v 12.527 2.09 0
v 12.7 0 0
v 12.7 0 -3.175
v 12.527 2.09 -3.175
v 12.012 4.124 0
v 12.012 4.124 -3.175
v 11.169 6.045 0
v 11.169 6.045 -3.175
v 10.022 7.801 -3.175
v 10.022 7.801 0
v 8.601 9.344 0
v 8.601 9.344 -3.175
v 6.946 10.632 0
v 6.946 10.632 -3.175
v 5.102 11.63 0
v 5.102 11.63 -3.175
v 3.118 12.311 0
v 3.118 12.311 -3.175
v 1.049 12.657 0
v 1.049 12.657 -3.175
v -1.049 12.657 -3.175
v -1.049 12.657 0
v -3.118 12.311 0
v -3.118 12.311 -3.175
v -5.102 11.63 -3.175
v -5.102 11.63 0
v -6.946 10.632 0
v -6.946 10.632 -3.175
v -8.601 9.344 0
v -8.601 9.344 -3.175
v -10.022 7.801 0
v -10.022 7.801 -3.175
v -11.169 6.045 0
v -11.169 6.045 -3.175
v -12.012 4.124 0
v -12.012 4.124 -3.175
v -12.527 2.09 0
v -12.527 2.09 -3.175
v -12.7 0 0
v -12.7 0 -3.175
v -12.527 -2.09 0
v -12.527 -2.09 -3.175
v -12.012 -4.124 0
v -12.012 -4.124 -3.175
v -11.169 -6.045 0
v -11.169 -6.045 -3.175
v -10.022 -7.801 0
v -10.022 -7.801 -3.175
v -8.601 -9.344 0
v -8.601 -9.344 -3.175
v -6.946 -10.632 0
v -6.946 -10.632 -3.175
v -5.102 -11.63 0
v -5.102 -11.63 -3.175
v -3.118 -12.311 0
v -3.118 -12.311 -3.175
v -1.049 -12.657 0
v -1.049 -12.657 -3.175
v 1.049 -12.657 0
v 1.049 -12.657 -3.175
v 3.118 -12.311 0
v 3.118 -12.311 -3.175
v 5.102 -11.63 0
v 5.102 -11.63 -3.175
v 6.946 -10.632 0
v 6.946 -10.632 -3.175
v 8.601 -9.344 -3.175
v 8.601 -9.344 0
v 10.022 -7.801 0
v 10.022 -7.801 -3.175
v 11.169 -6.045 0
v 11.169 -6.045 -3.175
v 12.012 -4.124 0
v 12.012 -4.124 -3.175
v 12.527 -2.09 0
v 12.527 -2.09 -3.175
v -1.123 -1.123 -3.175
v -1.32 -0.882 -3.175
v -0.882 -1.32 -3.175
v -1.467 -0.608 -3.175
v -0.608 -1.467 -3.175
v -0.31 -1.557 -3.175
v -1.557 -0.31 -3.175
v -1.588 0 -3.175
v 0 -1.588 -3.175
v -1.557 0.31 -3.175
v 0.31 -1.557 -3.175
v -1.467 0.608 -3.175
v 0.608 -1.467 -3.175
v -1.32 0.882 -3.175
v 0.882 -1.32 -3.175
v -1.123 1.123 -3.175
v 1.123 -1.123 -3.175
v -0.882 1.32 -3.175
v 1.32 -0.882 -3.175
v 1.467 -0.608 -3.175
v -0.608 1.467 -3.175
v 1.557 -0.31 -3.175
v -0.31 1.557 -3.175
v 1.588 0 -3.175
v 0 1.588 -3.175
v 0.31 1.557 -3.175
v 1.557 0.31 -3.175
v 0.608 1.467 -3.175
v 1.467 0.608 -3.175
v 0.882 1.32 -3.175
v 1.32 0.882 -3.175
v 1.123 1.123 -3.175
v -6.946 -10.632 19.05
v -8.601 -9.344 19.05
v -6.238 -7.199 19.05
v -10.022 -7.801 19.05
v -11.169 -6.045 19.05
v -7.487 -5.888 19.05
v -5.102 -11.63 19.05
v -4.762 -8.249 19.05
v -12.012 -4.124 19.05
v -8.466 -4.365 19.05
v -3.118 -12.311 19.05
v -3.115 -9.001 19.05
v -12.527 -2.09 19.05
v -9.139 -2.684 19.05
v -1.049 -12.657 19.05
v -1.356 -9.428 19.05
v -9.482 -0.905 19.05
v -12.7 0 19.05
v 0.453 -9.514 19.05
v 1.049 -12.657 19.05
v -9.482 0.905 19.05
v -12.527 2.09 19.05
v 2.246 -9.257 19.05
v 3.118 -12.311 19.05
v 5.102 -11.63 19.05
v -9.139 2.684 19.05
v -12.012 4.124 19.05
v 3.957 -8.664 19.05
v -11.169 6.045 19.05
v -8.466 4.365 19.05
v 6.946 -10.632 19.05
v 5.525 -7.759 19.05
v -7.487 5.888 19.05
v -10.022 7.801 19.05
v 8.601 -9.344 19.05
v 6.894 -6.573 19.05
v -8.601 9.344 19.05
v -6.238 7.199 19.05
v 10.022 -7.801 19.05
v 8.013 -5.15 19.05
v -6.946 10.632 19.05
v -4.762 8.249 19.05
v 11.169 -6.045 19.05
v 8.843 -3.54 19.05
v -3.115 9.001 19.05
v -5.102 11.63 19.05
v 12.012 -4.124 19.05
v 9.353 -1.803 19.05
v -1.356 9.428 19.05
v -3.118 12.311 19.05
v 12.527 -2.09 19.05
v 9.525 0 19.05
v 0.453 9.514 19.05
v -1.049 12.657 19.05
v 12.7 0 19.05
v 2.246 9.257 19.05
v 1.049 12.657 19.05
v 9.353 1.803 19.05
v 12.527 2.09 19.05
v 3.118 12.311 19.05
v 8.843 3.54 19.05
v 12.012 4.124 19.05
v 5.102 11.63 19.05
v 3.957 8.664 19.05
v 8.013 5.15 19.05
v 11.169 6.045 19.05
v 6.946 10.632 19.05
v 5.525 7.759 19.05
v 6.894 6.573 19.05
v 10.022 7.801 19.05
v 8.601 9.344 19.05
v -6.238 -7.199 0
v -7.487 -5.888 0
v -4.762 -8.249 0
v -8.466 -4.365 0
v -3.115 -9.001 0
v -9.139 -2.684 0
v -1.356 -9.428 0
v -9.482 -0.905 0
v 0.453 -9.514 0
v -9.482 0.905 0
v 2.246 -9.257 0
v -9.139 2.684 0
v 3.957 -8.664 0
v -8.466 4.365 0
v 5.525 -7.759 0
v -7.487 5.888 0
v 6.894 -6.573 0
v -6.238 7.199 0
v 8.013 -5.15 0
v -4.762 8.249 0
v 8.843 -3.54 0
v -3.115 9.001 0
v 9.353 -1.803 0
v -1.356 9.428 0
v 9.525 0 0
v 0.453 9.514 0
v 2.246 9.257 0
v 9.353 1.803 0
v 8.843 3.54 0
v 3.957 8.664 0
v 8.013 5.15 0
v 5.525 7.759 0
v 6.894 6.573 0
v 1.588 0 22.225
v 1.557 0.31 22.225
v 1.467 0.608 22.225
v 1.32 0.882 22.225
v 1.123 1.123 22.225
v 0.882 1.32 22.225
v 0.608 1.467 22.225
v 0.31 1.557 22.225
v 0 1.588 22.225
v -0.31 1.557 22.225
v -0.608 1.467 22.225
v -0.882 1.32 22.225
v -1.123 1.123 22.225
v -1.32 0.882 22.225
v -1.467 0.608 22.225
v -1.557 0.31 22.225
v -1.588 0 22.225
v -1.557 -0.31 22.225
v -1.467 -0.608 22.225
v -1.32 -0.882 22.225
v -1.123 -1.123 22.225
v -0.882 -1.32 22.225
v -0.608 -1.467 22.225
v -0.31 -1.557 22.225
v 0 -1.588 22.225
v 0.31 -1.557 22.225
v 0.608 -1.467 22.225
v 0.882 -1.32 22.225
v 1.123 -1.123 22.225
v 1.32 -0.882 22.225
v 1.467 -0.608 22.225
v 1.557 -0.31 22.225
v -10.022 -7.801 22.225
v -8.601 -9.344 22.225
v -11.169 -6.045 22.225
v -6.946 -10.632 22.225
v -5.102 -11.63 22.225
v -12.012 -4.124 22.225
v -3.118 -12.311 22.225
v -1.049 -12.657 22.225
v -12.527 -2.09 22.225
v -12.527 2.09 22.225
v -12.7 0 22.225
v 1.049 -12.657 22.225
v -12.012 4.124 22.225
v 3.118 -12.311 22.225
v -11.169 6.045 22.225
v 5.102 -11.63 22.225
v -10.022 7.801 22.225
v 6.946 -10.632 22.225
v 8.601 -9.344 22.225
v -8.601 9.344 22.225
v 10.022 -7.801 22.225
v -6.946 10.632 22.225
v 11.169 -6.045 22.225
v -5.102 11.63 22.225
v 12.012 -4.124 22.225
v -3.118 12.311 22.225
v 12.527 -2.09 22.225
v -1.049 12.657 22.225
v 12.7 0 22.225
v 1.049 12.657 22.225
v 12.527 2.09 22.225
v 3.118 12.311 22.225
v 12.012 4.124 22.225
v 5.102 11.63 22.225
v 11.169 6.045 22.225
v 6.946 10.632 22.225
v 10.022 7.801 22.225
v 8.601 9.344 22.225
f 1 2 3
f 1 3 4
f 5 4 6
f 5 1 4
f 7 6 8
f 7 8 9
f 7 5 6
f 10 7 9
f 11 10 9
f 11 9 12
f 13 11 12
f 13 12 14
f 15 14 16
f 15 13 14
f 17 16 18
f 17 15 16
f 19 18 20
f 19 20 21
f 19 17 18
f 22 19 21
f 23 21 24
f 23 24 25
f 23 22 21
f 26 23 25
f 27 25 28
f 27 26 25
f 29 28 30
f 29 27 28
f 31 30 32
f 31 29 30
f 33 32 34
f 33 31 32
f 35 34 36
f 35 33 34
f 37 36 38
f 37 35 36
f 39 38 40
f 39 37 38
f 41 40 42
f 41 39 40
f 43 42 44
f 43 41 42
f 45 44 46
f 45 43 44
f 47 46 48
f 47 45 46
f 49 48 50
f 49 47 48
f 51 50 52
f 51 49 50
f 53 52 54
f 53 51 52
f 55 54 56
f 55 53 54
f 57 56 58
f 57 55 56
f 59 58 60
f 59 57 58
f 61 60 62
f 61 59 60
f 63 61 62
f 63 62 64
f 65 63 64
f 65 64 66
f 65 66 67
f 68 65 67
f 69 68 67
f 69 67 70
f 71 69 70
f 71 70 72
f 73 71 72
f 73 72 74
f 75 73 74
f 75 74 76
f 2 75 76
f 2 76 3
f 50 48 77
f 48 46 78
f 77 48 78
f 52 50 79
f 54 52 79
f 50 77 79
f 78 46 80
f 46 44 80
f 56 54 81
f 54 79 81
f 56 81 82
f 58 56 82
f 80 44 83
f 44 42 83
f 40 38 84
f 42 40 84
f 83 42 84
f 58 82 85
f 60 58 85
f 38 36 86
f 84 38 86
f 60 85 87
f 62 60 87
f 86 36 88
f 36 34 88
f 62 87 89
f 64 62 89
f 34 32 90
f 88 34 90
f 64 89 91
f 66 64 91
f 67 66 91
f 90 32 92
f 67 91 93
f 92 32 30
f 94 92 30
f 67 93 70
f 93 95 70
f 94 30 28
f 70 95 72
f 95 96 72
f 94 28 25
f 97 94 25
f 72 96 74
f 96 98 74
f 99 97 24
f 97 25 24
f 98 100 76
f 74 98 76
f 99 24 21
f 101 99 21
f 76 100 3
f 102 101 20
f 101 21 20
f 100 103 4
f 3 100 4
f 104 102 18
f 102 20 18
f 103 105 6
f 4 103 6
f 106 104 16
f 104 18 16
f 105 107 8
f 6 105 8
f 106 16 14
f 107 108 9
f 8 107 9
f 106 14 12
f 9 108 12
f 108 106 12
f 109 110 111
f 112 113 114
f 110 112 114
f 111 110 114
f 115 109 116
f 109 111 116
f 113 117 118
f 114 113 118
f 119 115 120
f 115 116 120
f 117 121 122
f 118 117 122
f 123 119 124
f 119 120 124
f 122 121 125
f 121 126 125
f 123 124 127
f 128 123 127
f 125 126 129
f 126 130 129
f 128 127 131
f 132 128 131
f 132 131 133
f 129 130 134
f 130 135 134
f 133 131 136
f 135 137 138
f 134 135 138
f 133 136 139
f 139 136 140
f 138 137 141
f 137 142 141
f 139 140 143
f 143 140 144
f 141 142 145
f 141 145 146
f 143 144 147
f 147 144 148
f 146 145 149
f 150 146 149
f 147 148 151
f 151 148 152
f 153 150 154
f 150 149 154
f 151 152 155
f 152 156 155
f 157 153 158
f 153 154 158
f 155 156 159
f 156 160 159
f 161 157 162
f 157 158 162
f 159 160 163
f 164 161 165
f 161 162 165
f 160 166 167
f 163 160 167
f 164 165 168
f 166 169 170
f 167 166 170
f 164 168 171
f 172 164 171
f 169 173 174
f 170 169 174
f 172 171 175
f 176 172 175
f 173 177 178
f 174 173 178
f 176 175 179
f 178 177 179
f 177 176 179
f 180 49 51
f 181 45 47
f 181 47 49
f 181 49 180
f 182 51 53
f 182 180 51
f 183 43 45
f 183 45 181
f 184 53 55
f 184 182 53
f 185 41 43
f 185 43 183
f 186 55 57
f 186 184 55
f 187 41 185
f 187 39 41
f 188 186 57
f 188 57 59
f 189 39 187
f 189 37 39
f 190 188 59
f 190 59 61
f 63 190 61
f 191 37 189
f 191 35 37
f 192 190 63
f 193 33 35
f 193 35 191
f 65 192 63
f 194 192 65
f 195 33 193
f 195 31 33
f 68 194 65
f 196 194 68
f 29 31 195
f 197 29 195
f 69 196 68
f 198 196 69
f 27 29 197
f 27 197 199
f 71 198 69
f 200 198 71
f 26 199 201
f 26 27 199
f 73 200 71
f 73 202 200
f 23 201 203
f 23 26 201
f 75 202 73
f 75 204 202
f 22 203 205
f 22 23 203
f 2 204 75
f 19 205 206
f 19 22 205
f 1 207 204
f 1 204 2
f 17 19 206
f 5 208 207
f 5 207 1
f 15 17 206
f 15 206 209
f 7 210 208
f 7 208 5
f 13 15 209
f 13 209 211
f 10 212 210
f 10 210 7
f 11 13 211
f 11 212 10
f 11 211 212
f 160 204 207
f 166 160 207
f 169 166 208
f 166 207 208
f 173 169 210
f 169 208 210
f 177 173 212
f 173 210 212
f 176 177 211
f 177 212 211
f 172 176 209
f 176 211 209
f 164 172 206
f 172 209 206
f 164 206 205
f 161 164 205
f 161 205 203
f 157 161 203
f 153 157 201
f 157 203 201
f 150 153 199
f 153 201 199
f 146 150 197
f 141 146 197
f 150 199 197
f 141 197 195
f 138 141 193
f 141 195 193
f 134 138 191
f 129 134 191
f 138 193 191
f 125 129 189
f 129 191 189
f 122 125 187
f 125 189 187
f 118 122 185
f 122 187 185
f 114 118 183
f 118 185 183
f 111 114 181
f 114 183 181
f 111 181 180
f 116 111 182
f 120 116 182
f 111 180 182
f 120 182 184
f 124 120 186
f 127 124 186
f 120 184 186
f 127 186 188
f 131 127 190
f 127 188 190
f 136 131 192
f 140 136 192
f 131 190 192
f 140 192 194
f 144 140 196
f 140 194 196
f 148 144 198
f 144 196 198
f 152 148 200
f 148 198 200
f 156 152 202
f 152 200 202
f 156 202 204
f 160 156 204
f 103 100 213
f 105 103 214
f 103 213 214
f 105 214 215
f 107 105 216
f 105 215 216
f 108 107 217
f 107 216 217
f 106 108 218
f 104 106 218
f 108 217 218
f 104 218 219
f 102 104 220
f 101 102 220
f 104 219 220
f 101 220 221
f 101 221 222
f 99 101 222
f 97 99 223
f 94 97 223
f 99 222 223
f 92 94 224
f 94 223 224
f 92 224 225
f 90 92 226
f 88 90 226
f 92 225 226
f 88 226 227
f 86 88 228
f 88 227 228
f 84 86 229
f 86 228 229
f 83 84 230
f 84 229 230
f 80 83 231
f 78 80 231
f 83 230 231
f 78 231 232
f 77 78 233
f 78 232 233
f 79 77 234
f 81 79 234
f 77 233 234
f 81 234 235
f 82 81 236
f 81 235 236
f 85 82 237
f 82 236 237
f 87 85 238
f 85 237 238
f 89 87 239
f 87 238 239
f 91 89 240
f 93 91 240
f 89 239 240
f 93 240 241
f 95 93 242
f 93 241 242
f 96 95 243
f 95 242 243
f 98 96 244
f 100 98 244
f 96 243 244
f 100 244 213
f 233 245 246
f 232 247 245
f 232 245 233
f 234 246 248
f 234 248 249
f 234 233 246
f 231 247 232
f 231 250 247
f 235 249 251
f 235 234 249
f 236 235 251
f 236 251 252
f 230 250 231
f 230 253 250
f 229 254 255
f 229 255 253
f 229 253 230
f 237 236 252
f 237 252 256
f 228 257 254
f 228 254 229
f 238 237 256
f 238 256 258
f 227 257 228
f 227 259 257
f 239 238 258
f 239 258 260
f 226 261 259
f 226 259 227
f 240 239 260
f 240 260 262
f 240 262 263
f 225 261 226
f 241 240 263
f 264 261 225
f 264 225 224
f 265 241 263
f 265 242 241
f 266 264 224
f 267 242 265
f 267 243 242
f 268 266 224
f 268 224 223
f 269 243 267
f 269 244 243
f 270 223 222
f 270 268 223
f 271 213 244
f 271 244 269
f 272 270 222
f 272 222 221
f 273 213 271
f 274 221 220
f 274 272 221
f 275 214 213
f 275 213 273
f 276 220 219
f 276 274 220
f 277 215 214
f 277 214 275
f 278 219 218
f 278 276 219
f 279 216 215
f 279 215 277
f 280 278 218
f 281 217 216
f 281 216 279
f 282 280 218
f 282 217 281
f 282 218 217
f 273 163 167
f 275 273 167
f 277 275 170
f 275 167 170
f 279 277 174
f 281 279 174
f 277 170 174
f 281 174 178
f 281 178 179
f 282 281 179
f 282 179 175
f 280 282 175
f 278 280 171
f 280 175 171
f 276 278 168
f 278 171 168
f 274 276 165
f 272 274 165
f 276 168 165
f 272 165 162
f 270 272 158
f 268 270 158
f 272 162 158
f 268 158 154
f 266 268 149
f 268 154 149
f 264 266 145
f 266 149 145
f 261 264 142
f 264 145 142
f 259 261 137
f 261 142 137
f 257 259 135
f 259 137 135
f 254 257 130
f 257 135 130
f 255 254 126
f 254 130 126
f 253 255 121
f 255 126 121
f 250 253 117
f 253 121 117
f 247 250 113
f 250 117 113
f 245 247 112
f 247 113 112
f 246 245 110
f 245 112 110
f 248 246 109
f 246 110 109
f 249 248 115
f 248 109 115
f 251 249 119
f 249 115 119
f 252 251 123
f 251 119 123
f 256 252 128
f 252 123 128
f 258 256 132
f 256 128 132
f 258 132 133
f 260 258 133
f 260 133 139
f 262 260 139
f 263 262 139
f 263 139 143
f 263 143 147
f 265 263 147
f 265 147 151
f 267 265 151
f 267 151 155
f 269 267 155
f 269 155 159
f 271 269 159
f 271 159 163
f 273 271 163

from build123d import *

# Parameters (mm, degrees)
F0_R     = 9.525
F1_DEPTH = 19.05
F2_R     = 12.7
F3_DEPTH = 3.175
F4_R     = 12.7
F4_R_2   = 9.525
F5_DEPTH = 3.175
F6_R     = 1.5875
F7_DEPTH = 25.4


with BuildPart() as f1:
    # F0 (on Top) → F1 (new body)
    with BuildSketch(Plane.XY):
        Circle(F0_R)
    extrude(amount=F1_DEPTH)

    # F2 (on Top) → F3 (join)
    with BuildSketch(Plane.XY):
        Circle(F2_R)
    extrude(amount=-F3_DEPTH)

    # F4 (on face) → F5 (join)
    with BuildSketch(Plane.XY.offset(19.05)):
        Circle(F4_R)
        Circle(F4_R_2, mode=Mode.SUBTRACT)
        Circle(F4_R_2)
    extrude(amount=F5_DEPTH)

    # F6 (on Top) → F7 (cut, symmetric)
    with BuildSketch(Plane.XY):
        Circle(F6_R)
    extrude(amount=F7_DEPTH, both=True, mode=Mode.SUBTRACT)


solid = f1.part
